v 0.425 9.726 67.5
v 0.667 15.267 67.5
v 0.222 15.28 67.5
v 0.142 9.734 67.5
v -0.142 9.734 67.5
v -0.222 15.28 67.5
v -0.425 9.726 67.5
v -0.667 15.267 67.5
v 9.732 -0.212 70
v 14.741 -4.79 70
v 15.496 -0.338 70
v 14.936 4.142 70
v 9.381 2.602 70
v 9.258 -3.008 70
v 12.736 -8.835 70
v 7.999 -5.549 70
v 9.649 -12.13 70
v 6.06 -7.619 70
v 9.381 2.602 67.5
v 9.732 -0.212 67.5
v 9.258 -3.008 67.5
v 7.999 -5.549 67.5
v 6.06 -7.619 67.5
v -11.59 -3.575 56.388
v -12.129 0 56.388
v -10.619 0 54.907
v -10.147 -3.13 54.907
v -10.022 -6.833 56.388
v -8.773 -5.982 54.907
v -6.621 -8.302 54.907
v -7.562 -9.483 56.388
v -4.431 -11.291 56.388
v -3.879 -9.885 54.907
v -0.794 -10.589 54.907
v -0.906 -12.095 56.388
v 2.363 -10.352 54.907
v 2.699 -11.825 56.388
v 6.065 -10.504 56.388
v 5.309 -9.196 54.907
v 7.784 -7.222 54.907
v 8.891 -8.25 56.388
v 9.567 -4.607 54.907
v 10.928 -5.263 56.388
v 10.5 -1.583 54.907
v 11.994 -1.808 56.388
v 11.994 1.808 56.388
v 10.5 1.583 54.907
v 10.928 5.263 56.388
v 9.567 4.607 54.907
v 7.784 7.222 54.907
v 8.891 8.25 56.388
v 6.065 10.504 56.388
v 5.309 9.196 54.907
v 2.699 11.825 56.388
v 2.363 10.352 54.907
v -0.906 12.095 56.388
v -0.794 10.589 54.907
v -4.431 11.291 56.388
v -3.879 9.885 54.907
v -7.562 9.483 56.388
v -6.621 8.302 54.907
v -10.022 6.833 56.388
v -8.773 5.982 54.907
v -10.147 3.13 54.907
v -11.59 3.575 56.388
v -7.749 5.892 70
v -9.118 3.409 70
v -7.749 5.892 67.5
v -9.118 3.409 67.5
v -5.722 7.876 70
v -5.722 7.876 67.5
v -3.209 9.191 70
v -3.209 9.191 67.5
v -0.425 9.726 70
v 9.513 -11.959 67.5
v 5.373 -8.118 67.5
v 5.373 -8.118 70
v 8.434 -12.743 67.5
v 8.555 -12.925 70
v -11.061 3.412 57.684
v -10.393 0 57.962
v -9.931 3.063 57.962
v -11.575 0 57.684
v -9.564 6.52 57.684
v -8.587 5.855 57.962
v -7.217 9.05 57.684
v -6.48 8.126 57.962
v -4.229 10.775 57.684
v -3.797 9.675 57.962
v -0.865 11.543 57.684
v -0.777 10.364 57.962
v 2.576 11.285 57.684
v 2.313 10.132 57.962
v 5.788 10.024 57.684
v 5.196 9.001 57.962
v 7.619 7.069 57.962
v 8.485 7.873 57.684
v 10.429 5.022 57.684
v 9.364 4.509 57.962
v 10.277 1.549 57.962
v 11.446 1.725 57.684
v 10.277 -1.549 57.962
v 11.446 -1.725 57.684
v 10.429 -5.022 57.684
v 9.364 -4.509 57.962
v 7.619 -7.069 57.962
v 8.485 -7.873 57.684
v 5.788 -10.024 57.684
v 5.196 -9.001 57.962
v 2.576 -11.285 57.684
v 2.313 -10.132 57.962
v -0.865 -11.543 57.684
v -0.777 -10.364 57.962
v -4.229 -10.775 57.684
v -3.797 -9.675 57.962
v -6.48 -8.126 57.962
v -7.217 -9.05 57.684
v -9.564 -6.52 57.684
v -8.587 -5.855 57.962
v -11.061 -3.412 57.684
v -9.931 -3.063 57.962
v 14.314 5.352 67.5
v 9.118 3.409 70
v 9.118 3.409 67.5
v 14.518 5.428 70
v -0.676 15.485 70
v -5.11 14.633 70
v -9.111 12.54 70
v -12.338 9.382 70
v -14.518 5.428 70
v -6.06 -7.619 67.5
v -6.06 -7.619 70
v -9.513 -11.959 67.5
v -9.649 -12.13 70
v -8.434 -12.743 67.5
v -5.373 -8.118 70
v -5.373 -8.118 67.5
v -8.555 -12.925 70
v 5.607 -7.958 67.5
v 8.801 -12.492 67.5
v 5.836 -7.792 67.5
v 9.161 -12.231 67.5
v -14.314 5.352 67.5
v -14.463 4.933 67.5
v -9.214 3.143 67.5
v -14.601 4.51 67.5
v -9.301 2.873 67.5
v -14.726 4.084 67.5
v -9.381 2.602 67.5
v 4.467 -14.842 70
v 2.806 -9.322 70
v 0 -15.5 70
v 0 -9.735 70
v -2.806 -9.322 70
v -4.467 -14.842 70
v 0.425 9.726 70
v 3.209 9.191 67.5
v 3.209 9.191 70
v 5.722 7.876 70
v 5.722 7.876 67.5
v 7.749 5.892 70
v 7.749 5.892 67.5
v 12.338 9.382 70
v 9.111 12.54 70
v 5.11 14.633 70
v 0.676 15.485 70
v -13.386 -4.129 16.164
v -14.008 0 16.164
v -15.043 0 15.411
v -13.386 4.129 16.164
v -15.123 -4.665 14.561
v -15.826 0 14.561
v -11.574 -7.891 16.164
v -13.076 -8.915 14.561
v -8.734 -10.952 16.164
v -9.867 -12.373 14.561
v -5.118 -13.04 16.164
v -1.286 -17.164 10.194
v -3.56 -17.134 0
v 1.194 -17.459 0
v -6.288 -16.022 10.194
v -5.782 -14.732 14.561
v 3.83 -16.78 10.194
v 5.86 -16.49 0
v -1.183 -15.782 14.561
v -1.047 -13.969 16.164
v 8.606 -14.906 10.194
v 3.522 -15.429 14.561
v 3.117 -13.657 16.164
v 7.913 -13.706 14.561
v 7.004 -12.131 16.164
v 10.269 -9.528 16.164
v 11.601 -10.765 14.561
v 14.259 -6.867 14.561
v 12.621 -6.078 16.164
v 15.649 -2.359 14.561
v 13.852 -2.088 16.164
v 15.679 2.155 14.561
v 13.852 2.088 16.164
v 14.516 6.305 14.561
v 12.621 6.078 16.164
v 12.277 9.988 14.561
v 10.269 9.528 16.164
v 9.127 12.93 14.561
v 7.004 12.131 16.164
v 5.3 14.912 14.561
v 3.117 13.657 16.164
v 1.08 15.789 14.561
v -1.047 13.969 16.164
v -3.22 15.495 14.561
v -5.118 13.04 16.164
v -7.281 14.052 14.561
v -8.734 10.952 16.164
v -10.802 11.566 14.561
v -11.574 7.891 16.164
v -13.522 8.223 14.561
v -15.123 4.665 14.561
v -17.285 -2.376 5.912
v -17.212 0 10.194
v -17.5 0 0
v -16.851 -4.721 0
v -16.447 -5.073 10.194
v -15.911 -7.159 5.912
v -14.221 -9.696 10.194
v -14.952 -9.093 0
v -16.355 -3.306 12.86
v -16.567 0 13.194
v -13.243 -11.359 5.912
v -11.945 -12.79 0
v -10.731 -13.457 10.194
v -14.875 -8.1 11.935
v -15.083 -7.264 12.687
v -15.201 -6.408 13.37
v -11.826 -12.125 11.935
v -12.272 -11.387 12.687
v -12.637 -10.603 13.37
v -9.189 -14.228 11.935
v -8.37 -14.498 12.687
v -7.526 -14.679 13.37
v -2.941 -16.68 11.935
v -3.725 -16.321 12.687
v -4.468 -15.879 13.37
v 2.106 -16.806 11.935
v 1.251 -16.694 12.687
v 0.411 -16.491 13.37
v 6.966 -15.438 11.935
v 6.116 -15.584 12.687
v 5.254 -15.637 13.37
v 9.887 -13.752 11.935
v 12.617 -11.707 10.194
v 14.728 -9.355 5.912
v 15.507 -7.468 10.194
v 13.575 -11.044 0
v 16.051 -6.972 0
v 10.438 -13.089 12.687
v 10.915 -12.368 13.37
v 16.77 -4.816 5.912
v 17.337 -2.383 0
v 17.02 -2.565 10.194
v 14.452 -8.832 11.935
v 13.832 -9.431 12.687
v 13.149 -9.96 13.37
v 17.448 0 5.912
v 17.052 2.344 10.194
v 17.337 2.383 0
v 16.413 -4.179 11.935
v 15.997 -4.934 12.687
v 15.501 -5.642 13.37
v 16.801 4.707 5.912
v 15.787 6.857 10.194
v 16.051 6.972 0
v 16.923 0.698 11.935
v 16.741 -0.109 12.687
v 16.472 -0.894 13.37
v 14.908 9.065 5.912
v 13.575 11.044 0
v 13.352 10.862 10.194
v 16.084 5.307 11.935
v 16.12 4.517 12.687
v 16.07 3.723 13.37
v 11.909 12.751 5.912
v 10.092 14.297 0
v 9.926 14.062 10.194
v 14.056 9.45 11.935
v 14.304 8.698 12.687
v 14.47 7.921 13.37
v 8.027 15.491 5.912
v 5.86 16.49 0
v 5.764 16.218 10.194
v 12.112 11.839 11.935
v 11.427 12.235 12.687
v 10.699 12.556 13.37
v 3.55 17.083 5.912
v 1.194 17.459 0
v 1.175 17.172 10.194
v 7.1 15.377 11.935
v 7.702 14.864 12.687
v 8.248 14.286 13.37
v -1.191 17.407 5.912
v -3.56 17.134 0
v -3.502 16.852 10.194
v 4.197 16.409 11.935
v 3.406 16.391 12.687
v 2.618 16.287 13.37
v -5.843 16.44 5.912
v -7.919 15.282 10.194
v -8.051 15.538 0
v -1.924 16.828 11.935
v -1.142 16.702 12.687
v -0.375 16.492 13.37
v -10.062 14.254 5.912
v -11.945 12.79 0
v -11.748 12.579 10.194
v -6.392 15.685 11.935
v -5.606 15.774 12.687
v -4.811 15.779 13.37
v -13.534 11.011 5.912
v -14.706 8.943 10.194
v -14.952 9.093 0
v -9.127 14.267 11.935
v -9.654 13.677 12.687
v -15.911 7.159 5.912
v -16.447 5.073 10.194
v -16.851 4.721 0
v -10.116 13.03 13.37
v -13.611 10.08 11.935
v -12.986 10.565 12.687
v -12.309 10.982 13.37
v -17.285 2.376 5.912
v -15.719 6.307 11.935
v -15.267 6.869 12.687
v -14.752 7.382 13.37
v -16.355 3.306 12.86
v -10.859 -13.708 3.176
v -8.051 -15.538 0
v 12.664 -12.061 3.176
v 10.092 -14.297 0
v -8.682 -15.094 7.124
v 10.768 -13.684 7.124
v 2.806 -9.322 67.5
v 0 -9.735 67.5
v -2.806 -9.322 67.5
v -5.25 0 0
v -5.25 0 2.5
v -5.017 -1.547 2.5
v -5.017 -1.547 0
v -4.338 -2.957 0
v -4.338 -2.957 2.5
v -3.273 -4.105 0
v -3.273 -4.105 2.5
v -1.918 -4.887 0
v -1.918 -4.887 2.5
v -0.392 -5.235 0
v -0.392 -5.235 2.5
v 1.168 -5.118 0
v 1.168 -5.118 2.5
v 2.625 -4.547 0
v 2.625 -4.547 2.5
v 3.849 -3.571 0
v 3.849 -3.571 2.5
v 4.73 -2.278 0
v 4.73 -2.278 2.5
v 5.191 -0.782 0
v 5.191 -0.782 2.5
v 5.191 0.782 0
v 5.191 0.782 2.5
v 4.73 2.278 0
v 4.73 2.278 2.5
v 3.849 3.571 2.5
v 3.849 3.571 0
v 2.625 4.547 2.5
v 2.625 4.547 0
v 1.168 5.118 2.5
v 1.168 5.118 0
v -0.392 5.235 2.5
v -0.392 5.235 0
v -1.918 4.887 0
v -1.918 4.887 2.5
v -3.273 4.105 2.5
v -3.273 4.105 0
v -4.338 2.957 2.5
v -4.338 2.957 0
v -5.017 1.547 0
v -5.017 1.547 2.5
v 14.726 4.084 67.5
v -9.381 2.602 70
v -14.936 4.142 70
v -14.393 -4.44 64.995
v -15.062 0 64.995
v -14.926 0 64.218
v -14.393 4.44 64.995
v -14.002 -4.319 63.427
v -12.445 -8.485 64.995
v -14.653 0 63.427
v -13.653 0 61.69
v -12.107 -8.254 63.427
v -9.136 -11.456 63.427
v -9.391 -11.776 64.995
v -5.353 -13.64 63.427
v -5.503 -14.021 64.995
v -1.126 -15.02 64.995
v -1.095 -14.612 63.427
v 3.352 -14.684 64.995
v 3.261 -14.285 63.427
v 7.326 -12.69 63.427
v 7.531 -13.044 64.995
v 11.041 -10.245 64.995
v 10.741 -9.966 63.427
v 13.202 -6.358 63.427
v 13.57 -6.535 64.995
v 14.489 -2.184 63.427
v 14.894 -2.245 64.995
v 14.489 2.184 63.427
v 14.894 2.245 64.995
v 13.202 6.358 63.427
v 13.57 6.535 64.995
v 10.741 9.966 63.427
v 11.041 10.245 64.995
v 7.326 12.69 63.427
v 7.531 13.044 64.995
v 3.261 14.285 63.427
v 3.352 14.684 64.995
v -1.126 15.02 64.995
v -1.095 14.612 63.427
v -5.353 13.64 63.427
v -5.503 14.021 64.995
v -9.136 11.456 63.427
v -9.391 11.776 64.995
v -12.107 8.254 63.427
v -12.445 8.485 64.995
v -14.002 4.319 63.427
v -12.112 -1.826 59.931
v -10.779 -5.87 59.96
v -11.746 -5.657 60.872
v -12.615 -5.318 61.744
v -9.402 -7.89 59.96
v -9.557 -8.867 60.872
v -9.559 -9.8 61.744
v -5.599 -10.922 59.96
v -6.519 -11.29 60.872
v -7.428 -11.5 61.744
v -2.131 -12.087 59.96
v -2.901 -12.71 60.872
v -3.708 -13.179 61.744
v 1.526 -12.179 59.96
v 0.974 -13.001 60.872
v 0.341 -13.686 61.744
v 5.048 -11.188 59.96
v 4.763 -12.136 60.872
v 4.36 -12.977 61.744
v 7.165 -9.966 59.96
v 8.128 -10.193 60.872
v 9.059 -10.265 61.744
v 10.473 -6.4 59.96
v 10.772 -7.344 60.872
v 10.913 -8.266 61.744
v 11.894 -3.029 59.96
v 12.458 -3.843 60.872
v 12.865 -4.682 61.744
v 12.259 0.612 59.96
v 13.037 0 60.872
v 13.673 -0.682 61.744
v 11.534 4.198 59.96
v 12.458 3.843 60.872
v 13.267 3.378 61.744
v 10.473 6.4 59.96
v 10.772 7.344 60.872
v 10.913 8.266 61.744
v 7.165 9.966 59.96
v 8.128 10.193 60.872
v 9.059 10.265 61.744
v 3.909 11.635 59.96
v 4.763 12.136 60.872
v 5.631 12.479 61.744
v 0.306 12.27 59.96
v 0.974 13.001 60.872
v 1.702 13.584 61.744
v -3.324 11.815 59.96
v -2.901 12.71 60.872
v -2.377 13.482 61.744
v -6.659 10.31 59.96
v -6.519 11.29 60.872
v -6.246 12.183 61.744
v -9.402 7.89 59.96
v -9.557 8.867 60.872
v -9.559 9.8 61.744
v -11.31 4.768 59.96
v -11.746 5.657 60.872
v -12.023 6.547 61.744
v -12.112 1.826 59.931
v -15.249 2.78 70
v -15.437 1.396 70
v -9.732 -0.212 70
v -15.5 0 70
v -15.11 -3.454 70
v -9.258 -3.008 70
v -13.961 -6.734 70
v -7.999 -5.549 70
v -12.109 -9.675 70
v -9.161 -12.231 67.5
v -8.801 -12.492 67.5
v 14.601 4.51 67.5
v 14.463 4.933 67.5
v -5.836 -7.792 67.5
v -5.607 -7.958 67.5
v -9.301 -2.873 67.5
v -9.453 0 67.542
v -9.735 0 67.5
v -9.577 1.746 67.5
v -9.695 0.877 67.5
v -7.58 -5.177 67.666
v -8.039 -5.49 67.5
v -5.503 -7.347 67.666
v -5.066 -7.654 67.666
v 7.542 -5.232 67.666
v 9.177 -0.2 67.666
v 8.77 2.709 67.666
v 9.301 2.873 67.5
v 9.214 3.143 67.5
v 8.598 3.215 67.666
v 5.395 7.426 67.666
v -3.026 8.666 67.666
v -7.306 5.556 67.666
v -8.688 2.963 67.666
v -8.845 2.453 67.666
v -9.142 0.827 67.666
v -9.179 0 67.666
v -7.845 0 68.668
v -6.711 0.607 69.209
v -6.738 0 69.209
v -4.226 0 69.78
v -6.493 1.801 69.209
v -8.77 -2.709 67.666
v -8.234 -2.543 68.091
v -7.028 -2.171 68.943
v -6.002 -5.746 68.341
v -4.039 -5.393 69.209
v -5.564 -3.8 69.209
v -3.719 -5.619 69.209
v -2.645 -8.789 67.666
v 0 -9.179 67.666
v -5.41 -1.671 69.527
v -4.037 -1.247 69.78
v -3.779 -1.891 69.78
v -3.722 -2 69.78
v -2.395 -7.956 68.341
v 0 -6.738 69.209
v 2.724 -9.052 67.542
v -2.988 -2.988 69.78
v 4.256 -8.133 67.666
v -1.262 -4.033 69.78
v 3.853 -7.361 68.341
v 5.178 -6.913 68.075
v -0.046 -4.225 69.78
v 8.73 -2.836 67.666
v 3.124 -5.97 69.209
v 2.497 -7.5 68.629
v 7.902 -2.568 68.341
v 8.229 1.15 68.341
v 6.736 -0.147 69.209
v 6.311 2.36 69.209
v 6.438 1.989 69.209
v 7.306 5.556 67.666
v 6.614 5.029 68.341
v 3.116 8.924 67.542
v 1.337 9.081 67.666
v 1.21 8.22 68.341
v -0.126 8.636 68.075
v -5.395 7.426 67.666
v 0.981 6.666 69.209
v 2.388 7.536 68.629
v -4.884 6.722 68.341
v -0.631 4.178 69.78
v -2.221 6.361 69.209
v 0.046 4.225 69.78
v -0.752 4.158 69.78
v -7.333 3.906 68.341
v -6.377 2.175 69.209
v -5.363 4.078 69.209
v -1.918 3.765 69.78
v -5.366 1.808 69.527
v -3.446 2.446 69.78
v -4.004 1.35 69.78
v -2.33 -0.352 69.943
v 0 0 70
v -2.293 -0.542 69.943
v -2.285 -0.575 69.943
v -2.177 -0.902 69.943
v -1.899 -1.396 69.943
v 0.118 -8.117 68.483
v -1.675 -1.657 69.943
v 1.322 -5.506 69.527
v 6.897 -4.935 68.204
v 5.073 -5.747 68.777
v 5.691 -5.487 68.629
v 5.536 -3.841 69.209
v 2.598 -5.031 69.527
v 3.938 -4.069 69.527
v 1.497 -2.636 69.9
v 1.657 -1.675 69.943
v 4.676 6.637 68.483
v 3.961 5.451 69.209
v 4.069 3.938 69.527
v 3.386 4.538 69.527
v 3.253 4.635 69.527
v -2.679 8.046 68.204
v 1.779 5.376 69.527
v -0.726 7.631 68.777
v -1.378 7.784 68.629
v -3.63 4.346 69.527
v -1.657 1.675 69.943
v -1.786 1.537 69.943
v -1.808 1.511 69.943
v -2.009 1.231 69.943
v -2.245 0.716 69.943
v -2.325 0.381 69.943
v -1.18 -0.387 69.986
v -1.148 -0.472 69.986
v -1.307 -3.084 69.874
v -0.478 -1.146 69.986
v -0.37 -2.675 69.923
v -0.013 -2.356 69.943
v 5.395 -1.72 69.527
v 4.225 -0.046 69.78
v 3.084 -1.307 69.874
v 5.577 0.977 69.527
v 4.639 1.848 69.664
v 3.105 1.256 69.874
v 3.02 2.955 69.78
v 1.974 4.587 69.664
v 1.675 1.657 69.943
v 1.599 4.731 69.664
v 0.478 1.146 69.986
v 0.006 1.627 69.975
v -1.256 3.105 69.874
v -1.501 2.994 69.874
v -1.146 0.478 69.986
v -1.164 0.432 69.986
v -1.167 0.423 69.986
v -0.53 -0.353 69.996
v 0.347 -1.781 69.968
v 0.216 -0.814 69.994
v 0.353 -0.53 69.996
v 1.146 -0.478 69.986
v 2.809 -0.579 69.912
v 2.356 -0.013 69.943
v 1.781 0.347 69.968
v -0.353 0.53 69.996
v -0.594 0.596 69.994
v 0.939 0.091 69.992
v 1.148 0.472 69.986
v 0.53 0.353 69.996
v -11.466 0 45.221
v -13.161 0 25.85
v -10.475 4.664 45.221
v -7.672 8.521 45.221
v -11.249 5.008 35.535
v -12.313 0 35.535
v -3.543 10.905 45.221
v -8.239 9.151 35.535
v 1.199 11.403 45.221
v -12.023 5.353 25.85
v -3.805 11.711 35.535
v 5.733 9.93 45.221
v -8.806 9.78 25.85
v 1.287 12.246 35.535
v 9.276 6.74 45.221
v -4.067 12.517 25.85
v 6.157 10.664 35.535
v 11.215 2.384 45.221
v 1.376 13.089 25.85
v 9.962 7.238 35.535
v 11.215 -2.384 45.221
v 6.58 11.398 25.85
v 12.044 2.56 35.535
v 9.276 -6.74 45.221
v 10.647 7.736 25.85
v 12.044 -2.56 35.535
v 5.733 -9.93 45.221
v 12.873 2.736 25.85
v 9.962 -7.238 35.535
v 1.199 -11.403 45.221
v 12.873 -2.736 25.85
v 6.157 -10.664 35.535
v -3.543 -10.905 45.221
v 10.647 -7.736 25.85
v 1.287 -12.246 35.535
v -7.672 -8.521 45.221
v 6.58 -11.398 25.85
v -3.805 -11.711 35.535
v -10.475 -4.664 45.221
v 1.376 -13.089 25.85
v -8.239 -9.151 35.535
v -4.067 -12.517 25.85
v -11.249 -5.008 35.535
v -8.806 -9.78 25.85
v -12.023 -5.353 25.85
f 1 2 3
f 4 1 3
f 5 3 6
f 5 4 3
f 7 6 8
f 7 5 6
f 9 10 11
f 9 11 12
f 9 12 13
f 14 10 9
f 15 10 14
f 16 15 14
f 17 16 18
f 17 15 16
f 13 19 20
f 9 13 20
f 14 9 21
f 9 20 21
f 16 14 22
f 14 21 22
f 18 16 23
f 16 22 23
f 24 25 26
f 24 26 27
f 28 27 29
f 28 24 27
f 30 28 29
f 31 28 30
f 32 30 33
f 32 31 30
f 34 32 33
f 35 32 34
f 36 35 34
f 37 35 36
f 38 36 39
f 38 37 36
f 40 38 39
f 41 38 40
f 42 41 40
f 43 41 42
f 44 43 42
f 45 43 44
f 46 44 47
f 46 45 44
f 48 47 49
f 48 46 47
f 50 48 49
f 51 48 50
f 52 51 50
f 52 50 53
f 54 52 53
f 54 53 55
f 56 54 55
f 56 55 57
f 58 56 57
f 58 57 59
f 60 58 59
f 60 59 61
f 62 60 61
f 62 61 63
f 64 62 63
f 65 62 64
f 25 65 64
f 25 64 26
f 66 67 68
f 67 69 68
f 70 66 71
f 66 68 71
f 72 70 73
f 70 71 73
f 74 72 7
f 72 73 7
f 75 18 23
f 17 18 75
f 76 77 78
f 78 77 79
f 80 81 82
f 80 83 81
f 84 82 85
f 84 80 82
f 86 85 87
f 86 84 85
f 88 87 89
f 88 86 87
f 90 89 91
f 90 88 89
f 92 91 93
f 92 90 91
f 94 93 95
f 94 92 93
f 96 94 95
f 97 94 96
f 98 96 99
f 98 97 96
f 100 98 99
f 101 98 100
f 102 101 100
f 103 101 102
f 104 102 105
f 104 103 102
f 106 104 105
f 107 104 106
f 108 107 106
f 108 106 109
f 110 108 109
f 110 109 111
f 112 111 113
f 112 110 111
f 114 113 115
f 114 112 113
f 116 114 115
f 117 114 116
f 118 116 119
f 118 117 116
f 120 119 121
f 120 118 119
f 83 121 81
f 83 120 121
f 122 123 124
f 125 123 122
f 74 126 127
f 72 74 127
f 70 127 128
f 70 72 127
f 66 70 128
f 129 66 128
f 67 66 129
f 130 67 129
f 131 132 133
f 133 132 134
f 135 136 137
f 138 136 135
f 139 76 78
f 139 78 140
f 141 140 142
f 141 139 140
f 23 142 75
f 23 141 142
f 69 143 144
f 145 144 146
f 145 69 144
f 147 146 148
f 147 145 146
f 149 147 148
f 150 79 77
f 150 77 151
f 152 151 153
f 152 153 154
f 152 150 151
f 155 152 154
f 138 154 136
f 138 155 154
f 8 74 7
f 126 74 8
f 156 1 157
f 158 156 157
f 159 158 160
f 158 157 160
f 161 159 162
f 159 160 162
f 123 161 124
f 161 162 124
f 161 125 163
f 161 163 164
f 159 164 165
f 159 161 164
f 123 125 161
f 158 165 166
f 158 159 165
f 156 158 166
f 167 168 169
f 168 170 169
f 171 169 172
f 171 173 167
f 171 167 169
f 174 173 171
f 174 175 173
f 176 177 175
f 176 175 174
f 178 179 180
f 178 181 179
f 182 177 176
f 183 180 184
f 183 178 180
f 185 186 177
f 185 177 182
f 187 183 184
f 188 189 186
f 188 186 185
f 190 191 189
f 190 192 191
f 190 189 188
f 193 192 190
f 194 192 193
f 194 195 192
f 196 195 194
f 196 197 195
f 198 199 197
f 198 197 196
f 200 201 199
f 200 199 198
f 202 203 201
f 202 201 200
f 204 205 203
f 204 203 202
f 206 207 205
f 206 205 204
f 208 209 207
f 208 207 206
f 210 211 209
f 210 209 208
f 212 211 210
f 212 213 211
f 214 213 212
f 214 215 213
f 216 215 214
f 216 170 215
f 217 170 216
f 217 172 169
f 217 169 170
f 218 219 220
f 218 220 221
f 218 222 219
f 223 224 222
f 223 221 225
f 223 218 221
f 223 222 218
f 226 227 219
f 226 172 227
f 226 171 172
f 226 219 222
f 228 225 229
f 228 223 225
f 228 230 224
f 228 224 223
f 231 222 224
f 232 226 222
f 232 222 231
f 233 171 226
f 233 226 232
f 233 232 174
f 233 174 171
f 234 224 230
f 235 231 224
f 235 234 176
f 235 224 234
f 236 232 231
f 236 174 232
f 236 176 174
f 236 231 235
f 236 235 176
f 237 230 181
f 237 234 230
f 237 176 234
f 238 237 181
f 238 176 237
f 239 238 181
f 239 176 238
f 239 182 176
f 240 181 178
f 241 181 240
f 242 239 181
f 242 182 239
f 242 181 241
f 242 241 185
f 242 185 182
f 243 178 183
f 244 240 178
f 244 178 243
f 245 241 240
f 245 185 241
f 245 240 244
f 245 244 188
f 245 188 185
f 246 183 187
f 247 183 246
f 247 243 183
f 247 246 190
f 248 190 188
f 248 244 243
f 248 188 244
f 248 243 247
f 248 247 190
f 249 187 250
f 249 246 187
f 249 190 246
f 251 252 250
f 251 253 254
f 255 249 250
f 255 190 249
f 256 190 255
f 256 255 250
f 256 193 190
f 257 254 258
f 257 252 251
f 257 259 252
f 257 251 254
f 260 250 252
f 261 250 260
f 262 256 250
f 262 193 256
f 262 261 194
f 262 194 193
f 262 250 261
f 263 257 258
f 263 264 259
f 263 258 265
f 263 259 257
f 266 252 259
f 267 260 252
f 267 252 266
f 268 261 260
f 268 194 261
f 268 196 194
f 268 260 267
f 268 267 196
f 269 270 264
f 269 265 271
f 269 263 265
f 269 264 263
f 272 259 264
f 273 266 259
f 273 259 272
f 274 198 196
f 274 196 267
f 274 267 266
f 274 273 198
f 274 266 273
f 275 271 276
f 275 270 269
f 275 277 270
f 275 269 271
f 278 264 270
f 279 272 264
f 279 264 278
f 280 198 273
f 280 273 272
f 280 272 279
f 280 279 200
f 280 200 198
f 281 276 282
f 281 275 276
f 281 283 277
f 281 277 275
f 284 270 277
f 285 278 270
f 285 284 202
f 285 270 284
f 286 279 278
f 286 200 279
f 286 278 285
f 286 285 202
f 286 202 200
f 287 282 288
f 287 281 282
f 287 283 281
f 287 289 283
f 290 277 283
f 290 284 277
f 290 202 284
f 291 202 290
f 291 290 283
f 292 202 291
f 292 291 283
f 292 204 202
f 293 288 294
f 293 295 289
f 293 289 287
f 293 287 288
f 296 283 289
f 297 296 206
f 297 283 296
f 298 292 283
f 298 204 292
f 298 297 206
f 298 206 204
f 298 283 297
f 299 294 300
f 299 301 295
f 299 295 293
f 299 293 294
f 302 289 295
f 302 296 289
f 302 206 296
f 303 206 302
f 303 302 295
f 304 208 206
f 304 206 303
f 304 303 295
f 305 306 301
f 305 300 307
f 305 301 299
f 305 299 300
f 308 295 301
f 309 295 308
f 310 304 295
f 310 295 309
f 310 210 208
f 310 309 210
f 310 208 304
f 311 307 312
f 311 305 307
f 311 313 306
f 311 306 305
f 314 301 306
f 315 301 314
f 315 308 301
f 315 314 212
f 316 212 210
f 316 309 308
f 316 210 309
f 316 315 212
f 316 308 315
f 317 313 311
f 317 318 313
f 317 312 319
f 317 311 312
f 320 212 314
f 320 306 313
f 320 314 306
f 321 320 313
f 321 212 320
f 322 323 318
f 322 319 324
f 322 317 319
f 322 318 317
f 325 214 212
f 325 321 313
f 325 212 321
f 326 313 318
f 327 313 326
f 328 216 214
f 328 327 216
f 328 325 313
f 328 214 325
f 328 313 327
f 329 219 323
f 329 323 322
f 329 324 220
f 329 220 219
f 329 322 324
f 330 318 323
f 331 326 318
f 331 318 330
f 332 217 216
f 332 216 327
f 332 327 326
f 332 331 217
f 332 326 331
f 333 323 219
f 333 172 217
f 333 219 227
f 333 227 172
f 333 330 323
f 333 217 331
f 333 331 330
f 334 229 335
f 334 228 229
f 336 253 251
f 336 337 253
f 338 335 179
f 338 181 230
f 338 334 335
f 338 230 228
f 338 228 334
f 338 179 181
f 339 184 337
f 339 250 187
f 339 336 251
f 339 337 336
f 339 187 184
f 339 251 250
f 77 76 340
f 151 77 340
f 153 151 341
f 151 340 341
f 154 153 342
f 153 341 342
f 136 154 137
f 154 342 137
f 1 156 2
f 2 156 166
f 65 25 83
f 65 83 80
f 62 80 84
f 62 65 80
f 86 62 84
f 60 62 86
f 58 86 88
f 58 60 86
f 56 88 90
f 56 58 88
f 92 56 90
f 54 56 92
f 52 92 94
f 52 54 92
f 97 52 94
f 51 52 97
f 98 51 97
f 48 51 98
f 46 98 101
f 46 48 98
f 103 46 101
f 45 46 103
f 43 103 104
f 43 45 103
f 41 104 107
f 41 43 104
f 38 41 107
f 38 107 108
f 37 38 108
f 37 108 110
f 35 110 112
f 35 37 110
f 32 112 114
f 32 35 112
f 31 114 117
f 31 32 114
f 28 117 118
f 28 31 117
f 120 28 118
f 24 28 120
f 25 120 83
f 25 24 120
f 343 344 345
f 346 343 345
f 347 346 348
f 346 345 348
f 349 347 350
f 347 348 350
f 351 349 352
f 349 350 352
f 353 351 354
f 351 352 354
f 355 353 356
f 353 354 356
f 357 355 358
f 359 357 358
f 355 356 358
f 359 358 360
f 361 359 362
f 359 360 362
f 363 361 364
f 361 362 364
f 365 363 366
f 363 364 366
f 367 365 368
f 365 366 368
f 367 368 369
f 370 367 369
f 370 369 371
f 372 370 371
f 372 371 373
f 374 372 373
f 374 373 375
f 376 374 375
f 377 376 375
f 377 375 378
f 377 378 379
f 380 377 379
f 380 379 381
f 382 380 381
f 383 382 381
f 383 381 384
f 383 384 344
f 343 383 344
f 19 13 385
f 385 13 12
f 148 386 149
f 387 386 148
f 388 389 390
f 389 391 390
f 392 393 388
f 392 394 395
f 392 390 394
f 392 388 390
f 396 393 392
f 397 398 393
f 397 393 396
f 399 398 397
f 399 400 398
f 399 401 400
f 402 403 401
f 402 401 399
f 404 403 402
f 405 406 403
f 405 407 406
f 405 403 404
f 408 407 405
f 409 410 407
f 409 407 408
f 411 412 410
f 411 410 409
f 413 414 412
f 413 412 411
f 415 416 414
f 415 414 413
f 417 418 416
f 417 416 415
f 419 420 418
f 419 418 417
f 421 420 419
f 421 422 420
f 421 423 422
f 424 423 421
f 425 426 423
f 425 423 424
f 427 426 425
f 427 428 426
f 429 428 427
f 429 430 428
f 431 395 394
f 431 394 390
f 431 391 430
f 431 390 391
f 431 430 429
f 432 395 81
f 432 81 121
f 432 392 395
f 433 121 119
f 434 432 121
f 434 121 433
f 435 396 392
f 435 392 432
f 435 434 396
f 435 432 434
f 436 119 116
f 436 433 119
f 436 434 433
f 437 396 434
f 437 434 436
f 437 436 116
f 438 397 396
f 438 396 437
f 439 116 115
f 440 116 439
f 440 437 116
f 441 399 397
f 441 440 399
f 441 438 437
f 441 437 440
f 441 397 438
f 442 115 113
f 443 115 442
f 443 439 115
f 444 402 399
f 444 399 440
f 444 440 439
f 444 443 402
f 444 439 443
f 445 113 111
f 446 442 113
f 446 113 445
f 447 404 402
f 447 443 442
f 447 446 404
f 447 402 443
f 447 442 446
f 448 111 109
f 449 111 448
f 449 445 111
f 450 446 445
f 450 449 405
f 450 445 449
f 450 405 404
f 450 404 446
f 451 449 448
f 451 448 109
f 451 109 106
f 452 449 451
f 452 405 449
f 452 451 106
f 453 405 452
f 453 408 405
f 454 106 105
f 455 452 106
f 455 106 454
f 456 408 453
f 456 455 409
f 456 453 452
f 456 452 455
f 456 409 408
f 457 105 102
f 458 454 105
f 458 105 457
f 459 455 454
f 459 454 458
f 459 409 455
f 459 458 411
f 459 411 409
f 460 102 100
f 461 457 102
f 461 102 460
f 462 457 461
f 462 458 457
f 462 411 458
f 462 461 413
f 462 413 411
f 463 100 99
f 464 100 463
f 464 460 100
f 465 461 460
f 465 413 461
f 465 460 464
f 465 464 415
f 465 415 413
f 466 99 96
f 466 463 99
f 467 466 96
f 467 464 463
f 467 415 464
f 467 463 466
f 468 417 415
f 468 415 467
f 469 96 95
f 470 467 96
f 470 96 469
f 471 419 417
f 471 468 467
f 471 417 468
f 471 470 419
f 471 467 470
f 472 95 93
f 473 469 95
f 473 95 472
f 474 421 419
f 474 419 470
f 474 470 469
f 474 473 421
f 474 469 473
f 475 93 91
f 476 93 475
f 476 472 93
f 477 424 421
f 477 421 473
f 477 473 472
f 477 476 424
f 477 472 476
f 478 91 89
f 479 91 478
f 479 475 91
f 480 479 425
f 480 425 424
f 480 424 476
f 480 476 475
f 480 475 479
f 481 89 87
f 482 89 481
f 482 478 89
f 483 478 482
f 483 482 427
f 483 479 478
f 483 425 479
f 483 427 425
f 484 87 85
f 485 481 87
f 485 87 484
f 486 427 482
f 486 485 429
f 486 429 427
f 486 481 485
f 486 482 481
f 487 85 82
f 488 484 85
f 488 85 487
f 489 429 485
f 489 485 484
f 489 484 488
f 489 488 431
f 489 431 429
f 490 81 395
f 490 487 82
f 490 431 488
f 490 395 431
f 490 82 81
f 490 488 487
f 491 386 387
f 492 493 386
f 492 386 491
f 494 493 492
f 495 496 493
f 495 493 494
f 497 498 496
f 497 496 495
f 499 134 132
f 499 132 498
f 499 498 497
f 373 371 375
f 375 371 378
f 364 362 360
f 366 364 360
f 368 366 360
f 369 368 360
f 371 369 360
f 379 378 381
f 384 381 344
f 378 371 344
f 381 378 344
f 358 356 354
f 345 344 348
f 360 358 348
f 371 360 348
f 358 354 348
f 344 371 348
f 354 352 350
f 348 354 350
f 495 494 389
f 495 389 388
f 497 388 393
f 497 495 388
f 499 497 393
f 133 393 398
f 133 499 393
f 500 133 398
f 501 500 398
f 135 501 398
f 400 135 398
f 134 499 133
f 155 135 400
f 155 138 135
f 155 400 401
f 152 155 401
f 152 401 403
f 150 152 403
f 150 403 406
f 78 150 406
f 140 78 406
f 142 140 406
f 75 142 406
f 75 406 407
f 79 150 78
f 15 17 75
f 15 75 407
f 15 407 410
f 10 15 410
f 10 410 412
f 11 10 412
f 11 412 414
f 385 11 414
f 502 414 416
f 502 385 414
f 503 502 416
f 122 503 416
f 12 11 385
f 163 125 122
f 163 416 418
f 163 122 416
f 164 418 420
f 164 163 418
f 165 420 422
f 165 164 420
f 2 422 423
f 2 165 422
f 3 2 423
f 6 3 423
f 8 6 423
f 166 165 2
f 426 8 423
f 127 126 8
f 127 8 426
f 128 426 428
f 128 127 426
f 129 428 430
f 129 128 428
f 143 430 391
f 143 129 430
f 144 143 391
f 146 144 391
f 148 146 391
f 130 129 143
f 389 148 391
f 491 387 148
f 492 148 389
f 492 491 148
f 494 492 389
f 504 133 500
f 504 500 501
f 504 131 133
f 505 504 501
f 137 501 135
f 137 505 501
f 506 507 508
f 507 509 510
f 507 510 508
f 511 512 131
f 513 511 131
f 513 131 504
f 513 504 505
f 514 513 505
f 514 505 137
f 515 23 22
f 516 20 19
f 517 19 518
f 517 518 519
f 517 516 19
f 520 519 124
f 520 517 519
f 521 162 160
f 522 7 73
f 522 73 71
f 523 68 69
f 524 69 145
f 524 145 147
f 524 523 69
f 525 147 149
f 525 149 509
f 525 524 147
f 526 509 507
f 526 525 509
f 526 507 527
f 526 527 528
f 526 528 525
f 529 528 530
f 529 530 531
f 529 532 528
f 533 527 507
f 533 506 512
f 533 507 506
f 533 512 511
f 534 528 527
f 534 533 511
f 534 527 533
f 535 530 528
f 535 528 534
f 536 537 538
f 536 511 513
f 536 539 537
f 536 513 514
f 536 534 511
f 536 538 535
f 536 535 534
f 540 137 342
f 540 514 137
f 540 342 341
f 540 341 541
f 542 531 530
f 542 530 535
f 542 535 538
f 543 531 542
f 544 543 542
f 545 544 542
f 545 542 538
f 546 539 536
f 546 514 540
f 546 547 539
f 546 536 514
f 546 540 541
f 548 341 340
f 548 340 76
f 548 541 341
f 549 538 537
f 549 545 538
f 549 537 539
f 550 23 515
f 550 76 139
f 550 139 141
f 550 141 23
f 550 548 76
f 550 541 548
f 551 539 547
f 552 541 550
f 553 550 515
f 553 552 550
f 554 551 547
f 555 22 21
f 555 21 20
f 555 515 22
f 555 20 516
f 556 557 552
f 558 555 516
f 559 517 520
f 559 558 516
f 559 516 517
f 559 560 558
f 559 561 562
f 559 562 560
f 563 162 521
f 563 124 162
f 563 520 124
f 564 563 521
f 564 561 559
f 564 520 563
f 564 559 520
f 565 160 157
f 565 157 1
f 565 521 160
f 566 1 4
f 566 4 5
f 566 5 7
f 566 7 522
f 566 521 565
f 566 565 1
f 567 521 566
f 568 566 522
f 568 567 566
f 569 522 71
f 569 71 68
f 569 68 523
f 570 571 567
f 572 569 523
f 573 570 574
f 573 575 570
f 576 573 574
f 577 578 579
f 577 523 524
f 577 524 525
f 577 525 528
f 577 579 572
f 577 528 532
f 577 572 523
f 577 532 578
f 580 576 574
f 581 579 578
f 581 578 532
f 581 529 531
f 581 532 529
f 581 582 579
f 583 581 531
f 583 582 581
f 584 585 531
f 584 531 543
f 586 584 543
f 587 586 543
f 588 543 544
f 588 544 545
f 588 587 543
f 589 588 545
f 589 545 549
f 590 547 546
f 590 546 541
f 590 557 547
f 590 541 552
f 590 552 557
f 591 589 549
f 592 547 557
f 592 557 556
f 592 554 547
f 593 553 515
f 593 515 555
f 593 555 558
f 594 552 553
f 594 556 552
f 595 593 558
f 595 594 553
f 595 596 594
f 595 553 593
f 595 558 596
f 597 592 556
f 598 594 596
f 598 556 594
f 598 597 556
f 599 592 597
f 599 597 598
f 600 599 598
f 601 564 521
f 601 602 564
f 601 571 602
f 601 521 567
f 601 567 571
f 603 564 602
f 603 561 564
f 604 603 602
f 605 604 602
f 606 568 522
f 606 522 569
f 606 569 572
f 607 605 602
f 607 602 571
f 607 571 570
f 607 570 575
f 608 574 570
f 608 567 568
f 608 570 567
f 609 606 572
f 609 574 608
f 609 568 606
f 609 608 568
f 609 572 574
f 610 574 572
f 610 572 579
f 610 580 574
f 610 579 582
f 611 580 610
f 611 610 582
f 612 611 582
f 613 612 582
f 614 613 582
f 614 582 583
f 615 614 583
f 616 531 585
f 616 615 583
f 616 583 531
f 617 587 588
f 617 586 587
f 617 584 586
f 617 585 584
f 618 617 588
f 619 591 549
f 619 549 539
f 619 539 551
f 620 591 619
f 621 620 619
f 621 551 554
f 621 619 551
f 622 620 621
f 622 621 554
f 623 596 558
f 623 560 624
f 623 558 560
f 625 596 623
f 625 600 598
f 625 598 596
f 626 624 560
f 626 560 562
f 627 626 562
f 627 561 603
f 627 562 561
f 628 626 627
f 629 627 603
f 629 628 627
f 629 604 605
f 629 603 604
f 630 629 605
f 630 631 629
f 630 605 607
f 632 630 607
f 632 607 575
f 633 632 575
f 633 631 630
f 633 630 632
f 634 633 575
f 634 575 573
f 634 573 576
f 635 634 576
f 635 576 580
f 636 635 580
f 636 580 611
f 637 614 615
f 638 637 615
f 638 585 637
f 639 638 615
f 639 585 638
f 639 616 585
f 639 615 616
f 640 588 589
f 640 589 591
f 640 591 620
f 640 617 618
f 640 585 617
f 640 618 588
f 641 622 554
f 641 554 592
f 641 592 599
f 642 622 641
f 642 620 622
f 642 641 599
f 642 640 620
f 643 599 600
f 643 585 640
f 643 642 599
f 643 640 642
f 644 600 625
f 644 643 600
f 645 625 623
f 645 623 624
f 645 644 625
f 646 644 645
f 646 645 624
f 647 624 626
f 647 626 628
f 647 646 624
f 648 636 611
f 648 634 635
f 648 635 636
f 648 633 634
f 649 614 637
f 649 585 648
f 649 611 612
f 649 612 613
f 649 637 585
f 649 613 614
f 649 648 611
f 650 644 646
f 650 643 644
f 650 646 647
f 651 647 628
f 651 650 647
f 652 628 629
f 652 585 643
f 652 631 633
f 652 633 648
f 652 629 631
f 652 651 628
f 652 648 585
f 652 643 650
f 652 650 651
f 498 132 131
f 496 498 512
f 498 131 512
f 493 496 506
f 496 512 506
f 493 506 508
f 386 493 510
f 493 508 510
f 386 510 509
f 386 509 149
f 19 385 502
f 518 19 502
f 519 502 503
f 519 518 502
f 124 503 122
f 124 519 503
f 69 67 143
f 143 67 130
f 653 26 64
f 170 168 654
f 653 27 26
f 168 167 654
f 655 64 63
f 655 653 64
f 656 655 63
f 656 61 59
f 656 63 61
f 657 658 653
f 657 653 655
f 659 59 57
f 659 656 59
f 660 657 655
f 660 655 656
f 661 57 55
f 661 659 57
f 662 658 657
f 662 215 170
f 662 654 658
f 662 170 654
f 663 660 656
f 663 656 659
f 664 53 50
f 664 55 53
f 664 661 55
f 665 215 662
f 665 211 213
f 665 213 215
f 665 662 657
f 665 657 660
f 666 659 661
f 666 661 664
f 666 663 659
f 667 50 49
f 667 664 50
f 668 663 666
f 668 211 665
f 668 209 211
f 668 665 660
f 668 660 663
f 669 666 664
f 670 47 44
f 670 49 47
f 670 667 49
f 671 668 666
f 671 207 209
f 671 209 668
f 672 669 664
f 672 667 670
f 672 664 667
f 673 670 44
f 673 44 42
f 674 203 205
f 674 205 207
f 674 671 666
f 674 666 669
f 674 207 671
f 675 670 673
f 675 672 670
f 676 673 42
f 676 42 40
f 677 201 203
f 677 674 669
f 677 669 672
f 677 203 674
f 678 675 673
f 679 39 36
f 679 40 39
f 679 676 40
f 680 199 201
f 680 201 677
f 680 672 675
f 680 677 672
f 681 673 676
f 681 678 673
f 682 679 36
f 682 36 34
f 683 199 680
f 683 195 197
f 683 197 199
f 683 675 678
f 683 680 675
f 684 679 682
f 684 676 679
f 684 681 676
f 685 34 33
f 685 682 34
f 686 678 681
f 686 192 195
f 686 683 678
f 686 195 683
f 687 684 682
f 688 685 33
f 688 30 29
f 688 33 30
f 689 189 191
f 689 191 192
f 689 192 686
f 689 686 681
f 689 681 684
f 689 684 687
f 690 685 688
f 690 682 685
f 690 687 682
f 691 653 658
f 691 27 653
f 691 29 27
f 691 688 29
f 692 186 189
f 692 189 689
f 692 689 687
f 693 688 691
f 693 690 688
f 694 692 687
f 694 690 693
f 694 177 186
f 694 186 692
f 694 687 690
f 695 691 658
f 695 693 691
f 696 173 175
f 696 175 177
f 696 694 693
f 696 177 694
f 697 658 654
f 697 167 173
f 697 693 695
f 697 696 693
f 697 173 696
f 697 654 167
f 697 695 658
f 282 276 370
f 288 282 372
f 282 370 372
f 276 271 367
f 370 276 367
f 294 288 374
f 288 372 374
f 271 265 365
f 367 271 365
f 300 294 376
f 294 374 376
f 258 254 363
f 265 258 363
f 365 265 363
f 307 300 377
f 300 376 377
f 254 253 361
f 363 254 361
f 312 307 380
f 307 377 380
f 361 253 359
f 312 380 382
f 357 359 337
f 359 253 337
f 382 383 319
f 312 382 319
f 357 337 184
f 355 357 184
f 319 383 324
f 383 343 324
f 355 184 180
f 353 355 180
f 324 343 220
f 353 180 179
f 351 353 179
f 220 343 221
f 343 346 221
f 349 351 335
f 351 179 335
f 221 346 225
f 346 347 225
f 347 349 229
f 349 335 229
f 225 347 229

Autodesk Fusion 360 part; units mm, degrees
sketch "Sketch1" plane through (0, 0, 0) normal (0, 1, 0) x (1, 0, 0)
  line L0 (0, 0) -> (0, -70)
  line L1 (0, 0) -> (-17.5, 0)
  spline S0 degree 5 poles (-17.5, 0) (-17.5, -1.949) (-17.4812, -5.4749) (-17.3967, -9.6483) (-17.034, -13.32) (-15.2217, -16.0242) (-11.5143, -17.5778) (-6.6893, -18.7492) (-2.4074, -19.5755) (0, -20) knots 0 0 0 0 0 0 0.2 0.4 0.6 0.8 1 1 1 1 1 1
  line L2 (-5, -19.1184) -> (5, -20.8816)
  line L3 (-17.5, 4) -> (-17.5, -4)
  line L4 (-15.4223, 0) -> (-10.3547, -57.9233)
  spline S1 degree 5 poles (-10.3547, -57.9233) (-10.6938, -58.2624) (-11.3394, -58.9222) (-12.2103, -59.8566) (-13.1936, -61.0089) (-14.1589, -62.3571) (-14.7035, -63.4078) (-14.9524, -64.1982) (-15.0388, -64.7286) (-15.0621, -64.9946) knots 0 0 0 0 0 0 0.2 0.4 0.6 0.8 1 1 1 1 1 1
  line L5 (-15.0621, -64.9946) -> (-15.5, -70)
  line L6 (-14.9783, -64.0369) -> (-15.1459, -65.9522)
  line L7 (-17.5, -70) -> (0, -70) construction
  line L8 (-15.5, -70) -> (-9.7348, -70)
  line L9 (-9.7348, -70) -> (-9.7348, -67.5)
  line L10 (-9.0716, -56.6402) -> (-11.6378, -59.2064)
  line L11 (-17.5, 0) -> (-17.5, -70) construction
  spline S2 degree 5 poles (-9.7348, -67.5) (-9.5938, -67.5) (-9.3202, -67.5511) (-8.9352, -67.7806) (-8.3991, -68.3325) (-7.2315, -69.1675) (-5.359, -69.7194) (-3.0799, -69.9489) (-1.103, -70) (0, -70) knots 0 0 0 0 0 0 0.2 0.4 0.6 0.8 1 1 1 1 1 1
  line L12 (-10.1589, -67.5) -> (-9.3107, -67.5)
  line L13 (-3.3162, -70) -> (3.3162, -70)
  line L14 (-10.3504, -57.9716) -> (-11.575, -57.6845)
  line L15 (-12.1293, -56.3884) -> (-10.6186, -54.9071)
  line L16 (-11.575, -57.6845) -> (-12.1293, -56.3884)
  line L17 (-5.25, 0) -> (-5.25, -2.5)
  line L18 (-5.25, -2.5) -> (0, -2.5)
  dimension "d1" = 70
  dimension "d2" = 17.5
  dimension "d3" = 5
  dimension "d4" = 45
  dimension "d5" = 5
  dimension "d6" = 10
  dimension "d14" = 2.5
  dimension "d15" = 2
  dimension "d16" = 2.5
  dimension "d17" = 5.25
revolve "Revolve1" add sketch "Sketch1" angle 360 about axis through (0, 0, 0) along (0, 0, 1) contours L0 L1 S0 L4 L17 L18 | L0 S0 L4 S1 L5 L6 L8 L9 L10 S2 | L1 S0 L4 | L4 S1 L10 L14 L15 L16
sketch "Sketch3" plane through (0, 0, 70) normal (0, 0, 1) x (-1, 0, 0)
  circle A0 centre (0, 0) radius 9.7348
  circle A1 centre (0, 0) radius 15.5
  line L0 (0, 0) -> (0.6761, -15.4852)
  line L1 (0, 0) -> (-0.6761, -15.4852)
  line L2 (0, 0) -> (0, -15.5) construction
  dimension "d8" = 5
  dimension "d9" = 2.5
extrude "Extrude1" cut sketch "Sketch3" against normal up to surface (2.5 mm away) contours A0 A1 L0 L1 picked at (0.4421, -13.5697)
pattern_circular "C-Pattern1" count 5 over 360 about axis through (0, 0, 1.75) along (0, 0, 1) of "Extrude1"
equation "d2 = 3.5 cm / 2"
